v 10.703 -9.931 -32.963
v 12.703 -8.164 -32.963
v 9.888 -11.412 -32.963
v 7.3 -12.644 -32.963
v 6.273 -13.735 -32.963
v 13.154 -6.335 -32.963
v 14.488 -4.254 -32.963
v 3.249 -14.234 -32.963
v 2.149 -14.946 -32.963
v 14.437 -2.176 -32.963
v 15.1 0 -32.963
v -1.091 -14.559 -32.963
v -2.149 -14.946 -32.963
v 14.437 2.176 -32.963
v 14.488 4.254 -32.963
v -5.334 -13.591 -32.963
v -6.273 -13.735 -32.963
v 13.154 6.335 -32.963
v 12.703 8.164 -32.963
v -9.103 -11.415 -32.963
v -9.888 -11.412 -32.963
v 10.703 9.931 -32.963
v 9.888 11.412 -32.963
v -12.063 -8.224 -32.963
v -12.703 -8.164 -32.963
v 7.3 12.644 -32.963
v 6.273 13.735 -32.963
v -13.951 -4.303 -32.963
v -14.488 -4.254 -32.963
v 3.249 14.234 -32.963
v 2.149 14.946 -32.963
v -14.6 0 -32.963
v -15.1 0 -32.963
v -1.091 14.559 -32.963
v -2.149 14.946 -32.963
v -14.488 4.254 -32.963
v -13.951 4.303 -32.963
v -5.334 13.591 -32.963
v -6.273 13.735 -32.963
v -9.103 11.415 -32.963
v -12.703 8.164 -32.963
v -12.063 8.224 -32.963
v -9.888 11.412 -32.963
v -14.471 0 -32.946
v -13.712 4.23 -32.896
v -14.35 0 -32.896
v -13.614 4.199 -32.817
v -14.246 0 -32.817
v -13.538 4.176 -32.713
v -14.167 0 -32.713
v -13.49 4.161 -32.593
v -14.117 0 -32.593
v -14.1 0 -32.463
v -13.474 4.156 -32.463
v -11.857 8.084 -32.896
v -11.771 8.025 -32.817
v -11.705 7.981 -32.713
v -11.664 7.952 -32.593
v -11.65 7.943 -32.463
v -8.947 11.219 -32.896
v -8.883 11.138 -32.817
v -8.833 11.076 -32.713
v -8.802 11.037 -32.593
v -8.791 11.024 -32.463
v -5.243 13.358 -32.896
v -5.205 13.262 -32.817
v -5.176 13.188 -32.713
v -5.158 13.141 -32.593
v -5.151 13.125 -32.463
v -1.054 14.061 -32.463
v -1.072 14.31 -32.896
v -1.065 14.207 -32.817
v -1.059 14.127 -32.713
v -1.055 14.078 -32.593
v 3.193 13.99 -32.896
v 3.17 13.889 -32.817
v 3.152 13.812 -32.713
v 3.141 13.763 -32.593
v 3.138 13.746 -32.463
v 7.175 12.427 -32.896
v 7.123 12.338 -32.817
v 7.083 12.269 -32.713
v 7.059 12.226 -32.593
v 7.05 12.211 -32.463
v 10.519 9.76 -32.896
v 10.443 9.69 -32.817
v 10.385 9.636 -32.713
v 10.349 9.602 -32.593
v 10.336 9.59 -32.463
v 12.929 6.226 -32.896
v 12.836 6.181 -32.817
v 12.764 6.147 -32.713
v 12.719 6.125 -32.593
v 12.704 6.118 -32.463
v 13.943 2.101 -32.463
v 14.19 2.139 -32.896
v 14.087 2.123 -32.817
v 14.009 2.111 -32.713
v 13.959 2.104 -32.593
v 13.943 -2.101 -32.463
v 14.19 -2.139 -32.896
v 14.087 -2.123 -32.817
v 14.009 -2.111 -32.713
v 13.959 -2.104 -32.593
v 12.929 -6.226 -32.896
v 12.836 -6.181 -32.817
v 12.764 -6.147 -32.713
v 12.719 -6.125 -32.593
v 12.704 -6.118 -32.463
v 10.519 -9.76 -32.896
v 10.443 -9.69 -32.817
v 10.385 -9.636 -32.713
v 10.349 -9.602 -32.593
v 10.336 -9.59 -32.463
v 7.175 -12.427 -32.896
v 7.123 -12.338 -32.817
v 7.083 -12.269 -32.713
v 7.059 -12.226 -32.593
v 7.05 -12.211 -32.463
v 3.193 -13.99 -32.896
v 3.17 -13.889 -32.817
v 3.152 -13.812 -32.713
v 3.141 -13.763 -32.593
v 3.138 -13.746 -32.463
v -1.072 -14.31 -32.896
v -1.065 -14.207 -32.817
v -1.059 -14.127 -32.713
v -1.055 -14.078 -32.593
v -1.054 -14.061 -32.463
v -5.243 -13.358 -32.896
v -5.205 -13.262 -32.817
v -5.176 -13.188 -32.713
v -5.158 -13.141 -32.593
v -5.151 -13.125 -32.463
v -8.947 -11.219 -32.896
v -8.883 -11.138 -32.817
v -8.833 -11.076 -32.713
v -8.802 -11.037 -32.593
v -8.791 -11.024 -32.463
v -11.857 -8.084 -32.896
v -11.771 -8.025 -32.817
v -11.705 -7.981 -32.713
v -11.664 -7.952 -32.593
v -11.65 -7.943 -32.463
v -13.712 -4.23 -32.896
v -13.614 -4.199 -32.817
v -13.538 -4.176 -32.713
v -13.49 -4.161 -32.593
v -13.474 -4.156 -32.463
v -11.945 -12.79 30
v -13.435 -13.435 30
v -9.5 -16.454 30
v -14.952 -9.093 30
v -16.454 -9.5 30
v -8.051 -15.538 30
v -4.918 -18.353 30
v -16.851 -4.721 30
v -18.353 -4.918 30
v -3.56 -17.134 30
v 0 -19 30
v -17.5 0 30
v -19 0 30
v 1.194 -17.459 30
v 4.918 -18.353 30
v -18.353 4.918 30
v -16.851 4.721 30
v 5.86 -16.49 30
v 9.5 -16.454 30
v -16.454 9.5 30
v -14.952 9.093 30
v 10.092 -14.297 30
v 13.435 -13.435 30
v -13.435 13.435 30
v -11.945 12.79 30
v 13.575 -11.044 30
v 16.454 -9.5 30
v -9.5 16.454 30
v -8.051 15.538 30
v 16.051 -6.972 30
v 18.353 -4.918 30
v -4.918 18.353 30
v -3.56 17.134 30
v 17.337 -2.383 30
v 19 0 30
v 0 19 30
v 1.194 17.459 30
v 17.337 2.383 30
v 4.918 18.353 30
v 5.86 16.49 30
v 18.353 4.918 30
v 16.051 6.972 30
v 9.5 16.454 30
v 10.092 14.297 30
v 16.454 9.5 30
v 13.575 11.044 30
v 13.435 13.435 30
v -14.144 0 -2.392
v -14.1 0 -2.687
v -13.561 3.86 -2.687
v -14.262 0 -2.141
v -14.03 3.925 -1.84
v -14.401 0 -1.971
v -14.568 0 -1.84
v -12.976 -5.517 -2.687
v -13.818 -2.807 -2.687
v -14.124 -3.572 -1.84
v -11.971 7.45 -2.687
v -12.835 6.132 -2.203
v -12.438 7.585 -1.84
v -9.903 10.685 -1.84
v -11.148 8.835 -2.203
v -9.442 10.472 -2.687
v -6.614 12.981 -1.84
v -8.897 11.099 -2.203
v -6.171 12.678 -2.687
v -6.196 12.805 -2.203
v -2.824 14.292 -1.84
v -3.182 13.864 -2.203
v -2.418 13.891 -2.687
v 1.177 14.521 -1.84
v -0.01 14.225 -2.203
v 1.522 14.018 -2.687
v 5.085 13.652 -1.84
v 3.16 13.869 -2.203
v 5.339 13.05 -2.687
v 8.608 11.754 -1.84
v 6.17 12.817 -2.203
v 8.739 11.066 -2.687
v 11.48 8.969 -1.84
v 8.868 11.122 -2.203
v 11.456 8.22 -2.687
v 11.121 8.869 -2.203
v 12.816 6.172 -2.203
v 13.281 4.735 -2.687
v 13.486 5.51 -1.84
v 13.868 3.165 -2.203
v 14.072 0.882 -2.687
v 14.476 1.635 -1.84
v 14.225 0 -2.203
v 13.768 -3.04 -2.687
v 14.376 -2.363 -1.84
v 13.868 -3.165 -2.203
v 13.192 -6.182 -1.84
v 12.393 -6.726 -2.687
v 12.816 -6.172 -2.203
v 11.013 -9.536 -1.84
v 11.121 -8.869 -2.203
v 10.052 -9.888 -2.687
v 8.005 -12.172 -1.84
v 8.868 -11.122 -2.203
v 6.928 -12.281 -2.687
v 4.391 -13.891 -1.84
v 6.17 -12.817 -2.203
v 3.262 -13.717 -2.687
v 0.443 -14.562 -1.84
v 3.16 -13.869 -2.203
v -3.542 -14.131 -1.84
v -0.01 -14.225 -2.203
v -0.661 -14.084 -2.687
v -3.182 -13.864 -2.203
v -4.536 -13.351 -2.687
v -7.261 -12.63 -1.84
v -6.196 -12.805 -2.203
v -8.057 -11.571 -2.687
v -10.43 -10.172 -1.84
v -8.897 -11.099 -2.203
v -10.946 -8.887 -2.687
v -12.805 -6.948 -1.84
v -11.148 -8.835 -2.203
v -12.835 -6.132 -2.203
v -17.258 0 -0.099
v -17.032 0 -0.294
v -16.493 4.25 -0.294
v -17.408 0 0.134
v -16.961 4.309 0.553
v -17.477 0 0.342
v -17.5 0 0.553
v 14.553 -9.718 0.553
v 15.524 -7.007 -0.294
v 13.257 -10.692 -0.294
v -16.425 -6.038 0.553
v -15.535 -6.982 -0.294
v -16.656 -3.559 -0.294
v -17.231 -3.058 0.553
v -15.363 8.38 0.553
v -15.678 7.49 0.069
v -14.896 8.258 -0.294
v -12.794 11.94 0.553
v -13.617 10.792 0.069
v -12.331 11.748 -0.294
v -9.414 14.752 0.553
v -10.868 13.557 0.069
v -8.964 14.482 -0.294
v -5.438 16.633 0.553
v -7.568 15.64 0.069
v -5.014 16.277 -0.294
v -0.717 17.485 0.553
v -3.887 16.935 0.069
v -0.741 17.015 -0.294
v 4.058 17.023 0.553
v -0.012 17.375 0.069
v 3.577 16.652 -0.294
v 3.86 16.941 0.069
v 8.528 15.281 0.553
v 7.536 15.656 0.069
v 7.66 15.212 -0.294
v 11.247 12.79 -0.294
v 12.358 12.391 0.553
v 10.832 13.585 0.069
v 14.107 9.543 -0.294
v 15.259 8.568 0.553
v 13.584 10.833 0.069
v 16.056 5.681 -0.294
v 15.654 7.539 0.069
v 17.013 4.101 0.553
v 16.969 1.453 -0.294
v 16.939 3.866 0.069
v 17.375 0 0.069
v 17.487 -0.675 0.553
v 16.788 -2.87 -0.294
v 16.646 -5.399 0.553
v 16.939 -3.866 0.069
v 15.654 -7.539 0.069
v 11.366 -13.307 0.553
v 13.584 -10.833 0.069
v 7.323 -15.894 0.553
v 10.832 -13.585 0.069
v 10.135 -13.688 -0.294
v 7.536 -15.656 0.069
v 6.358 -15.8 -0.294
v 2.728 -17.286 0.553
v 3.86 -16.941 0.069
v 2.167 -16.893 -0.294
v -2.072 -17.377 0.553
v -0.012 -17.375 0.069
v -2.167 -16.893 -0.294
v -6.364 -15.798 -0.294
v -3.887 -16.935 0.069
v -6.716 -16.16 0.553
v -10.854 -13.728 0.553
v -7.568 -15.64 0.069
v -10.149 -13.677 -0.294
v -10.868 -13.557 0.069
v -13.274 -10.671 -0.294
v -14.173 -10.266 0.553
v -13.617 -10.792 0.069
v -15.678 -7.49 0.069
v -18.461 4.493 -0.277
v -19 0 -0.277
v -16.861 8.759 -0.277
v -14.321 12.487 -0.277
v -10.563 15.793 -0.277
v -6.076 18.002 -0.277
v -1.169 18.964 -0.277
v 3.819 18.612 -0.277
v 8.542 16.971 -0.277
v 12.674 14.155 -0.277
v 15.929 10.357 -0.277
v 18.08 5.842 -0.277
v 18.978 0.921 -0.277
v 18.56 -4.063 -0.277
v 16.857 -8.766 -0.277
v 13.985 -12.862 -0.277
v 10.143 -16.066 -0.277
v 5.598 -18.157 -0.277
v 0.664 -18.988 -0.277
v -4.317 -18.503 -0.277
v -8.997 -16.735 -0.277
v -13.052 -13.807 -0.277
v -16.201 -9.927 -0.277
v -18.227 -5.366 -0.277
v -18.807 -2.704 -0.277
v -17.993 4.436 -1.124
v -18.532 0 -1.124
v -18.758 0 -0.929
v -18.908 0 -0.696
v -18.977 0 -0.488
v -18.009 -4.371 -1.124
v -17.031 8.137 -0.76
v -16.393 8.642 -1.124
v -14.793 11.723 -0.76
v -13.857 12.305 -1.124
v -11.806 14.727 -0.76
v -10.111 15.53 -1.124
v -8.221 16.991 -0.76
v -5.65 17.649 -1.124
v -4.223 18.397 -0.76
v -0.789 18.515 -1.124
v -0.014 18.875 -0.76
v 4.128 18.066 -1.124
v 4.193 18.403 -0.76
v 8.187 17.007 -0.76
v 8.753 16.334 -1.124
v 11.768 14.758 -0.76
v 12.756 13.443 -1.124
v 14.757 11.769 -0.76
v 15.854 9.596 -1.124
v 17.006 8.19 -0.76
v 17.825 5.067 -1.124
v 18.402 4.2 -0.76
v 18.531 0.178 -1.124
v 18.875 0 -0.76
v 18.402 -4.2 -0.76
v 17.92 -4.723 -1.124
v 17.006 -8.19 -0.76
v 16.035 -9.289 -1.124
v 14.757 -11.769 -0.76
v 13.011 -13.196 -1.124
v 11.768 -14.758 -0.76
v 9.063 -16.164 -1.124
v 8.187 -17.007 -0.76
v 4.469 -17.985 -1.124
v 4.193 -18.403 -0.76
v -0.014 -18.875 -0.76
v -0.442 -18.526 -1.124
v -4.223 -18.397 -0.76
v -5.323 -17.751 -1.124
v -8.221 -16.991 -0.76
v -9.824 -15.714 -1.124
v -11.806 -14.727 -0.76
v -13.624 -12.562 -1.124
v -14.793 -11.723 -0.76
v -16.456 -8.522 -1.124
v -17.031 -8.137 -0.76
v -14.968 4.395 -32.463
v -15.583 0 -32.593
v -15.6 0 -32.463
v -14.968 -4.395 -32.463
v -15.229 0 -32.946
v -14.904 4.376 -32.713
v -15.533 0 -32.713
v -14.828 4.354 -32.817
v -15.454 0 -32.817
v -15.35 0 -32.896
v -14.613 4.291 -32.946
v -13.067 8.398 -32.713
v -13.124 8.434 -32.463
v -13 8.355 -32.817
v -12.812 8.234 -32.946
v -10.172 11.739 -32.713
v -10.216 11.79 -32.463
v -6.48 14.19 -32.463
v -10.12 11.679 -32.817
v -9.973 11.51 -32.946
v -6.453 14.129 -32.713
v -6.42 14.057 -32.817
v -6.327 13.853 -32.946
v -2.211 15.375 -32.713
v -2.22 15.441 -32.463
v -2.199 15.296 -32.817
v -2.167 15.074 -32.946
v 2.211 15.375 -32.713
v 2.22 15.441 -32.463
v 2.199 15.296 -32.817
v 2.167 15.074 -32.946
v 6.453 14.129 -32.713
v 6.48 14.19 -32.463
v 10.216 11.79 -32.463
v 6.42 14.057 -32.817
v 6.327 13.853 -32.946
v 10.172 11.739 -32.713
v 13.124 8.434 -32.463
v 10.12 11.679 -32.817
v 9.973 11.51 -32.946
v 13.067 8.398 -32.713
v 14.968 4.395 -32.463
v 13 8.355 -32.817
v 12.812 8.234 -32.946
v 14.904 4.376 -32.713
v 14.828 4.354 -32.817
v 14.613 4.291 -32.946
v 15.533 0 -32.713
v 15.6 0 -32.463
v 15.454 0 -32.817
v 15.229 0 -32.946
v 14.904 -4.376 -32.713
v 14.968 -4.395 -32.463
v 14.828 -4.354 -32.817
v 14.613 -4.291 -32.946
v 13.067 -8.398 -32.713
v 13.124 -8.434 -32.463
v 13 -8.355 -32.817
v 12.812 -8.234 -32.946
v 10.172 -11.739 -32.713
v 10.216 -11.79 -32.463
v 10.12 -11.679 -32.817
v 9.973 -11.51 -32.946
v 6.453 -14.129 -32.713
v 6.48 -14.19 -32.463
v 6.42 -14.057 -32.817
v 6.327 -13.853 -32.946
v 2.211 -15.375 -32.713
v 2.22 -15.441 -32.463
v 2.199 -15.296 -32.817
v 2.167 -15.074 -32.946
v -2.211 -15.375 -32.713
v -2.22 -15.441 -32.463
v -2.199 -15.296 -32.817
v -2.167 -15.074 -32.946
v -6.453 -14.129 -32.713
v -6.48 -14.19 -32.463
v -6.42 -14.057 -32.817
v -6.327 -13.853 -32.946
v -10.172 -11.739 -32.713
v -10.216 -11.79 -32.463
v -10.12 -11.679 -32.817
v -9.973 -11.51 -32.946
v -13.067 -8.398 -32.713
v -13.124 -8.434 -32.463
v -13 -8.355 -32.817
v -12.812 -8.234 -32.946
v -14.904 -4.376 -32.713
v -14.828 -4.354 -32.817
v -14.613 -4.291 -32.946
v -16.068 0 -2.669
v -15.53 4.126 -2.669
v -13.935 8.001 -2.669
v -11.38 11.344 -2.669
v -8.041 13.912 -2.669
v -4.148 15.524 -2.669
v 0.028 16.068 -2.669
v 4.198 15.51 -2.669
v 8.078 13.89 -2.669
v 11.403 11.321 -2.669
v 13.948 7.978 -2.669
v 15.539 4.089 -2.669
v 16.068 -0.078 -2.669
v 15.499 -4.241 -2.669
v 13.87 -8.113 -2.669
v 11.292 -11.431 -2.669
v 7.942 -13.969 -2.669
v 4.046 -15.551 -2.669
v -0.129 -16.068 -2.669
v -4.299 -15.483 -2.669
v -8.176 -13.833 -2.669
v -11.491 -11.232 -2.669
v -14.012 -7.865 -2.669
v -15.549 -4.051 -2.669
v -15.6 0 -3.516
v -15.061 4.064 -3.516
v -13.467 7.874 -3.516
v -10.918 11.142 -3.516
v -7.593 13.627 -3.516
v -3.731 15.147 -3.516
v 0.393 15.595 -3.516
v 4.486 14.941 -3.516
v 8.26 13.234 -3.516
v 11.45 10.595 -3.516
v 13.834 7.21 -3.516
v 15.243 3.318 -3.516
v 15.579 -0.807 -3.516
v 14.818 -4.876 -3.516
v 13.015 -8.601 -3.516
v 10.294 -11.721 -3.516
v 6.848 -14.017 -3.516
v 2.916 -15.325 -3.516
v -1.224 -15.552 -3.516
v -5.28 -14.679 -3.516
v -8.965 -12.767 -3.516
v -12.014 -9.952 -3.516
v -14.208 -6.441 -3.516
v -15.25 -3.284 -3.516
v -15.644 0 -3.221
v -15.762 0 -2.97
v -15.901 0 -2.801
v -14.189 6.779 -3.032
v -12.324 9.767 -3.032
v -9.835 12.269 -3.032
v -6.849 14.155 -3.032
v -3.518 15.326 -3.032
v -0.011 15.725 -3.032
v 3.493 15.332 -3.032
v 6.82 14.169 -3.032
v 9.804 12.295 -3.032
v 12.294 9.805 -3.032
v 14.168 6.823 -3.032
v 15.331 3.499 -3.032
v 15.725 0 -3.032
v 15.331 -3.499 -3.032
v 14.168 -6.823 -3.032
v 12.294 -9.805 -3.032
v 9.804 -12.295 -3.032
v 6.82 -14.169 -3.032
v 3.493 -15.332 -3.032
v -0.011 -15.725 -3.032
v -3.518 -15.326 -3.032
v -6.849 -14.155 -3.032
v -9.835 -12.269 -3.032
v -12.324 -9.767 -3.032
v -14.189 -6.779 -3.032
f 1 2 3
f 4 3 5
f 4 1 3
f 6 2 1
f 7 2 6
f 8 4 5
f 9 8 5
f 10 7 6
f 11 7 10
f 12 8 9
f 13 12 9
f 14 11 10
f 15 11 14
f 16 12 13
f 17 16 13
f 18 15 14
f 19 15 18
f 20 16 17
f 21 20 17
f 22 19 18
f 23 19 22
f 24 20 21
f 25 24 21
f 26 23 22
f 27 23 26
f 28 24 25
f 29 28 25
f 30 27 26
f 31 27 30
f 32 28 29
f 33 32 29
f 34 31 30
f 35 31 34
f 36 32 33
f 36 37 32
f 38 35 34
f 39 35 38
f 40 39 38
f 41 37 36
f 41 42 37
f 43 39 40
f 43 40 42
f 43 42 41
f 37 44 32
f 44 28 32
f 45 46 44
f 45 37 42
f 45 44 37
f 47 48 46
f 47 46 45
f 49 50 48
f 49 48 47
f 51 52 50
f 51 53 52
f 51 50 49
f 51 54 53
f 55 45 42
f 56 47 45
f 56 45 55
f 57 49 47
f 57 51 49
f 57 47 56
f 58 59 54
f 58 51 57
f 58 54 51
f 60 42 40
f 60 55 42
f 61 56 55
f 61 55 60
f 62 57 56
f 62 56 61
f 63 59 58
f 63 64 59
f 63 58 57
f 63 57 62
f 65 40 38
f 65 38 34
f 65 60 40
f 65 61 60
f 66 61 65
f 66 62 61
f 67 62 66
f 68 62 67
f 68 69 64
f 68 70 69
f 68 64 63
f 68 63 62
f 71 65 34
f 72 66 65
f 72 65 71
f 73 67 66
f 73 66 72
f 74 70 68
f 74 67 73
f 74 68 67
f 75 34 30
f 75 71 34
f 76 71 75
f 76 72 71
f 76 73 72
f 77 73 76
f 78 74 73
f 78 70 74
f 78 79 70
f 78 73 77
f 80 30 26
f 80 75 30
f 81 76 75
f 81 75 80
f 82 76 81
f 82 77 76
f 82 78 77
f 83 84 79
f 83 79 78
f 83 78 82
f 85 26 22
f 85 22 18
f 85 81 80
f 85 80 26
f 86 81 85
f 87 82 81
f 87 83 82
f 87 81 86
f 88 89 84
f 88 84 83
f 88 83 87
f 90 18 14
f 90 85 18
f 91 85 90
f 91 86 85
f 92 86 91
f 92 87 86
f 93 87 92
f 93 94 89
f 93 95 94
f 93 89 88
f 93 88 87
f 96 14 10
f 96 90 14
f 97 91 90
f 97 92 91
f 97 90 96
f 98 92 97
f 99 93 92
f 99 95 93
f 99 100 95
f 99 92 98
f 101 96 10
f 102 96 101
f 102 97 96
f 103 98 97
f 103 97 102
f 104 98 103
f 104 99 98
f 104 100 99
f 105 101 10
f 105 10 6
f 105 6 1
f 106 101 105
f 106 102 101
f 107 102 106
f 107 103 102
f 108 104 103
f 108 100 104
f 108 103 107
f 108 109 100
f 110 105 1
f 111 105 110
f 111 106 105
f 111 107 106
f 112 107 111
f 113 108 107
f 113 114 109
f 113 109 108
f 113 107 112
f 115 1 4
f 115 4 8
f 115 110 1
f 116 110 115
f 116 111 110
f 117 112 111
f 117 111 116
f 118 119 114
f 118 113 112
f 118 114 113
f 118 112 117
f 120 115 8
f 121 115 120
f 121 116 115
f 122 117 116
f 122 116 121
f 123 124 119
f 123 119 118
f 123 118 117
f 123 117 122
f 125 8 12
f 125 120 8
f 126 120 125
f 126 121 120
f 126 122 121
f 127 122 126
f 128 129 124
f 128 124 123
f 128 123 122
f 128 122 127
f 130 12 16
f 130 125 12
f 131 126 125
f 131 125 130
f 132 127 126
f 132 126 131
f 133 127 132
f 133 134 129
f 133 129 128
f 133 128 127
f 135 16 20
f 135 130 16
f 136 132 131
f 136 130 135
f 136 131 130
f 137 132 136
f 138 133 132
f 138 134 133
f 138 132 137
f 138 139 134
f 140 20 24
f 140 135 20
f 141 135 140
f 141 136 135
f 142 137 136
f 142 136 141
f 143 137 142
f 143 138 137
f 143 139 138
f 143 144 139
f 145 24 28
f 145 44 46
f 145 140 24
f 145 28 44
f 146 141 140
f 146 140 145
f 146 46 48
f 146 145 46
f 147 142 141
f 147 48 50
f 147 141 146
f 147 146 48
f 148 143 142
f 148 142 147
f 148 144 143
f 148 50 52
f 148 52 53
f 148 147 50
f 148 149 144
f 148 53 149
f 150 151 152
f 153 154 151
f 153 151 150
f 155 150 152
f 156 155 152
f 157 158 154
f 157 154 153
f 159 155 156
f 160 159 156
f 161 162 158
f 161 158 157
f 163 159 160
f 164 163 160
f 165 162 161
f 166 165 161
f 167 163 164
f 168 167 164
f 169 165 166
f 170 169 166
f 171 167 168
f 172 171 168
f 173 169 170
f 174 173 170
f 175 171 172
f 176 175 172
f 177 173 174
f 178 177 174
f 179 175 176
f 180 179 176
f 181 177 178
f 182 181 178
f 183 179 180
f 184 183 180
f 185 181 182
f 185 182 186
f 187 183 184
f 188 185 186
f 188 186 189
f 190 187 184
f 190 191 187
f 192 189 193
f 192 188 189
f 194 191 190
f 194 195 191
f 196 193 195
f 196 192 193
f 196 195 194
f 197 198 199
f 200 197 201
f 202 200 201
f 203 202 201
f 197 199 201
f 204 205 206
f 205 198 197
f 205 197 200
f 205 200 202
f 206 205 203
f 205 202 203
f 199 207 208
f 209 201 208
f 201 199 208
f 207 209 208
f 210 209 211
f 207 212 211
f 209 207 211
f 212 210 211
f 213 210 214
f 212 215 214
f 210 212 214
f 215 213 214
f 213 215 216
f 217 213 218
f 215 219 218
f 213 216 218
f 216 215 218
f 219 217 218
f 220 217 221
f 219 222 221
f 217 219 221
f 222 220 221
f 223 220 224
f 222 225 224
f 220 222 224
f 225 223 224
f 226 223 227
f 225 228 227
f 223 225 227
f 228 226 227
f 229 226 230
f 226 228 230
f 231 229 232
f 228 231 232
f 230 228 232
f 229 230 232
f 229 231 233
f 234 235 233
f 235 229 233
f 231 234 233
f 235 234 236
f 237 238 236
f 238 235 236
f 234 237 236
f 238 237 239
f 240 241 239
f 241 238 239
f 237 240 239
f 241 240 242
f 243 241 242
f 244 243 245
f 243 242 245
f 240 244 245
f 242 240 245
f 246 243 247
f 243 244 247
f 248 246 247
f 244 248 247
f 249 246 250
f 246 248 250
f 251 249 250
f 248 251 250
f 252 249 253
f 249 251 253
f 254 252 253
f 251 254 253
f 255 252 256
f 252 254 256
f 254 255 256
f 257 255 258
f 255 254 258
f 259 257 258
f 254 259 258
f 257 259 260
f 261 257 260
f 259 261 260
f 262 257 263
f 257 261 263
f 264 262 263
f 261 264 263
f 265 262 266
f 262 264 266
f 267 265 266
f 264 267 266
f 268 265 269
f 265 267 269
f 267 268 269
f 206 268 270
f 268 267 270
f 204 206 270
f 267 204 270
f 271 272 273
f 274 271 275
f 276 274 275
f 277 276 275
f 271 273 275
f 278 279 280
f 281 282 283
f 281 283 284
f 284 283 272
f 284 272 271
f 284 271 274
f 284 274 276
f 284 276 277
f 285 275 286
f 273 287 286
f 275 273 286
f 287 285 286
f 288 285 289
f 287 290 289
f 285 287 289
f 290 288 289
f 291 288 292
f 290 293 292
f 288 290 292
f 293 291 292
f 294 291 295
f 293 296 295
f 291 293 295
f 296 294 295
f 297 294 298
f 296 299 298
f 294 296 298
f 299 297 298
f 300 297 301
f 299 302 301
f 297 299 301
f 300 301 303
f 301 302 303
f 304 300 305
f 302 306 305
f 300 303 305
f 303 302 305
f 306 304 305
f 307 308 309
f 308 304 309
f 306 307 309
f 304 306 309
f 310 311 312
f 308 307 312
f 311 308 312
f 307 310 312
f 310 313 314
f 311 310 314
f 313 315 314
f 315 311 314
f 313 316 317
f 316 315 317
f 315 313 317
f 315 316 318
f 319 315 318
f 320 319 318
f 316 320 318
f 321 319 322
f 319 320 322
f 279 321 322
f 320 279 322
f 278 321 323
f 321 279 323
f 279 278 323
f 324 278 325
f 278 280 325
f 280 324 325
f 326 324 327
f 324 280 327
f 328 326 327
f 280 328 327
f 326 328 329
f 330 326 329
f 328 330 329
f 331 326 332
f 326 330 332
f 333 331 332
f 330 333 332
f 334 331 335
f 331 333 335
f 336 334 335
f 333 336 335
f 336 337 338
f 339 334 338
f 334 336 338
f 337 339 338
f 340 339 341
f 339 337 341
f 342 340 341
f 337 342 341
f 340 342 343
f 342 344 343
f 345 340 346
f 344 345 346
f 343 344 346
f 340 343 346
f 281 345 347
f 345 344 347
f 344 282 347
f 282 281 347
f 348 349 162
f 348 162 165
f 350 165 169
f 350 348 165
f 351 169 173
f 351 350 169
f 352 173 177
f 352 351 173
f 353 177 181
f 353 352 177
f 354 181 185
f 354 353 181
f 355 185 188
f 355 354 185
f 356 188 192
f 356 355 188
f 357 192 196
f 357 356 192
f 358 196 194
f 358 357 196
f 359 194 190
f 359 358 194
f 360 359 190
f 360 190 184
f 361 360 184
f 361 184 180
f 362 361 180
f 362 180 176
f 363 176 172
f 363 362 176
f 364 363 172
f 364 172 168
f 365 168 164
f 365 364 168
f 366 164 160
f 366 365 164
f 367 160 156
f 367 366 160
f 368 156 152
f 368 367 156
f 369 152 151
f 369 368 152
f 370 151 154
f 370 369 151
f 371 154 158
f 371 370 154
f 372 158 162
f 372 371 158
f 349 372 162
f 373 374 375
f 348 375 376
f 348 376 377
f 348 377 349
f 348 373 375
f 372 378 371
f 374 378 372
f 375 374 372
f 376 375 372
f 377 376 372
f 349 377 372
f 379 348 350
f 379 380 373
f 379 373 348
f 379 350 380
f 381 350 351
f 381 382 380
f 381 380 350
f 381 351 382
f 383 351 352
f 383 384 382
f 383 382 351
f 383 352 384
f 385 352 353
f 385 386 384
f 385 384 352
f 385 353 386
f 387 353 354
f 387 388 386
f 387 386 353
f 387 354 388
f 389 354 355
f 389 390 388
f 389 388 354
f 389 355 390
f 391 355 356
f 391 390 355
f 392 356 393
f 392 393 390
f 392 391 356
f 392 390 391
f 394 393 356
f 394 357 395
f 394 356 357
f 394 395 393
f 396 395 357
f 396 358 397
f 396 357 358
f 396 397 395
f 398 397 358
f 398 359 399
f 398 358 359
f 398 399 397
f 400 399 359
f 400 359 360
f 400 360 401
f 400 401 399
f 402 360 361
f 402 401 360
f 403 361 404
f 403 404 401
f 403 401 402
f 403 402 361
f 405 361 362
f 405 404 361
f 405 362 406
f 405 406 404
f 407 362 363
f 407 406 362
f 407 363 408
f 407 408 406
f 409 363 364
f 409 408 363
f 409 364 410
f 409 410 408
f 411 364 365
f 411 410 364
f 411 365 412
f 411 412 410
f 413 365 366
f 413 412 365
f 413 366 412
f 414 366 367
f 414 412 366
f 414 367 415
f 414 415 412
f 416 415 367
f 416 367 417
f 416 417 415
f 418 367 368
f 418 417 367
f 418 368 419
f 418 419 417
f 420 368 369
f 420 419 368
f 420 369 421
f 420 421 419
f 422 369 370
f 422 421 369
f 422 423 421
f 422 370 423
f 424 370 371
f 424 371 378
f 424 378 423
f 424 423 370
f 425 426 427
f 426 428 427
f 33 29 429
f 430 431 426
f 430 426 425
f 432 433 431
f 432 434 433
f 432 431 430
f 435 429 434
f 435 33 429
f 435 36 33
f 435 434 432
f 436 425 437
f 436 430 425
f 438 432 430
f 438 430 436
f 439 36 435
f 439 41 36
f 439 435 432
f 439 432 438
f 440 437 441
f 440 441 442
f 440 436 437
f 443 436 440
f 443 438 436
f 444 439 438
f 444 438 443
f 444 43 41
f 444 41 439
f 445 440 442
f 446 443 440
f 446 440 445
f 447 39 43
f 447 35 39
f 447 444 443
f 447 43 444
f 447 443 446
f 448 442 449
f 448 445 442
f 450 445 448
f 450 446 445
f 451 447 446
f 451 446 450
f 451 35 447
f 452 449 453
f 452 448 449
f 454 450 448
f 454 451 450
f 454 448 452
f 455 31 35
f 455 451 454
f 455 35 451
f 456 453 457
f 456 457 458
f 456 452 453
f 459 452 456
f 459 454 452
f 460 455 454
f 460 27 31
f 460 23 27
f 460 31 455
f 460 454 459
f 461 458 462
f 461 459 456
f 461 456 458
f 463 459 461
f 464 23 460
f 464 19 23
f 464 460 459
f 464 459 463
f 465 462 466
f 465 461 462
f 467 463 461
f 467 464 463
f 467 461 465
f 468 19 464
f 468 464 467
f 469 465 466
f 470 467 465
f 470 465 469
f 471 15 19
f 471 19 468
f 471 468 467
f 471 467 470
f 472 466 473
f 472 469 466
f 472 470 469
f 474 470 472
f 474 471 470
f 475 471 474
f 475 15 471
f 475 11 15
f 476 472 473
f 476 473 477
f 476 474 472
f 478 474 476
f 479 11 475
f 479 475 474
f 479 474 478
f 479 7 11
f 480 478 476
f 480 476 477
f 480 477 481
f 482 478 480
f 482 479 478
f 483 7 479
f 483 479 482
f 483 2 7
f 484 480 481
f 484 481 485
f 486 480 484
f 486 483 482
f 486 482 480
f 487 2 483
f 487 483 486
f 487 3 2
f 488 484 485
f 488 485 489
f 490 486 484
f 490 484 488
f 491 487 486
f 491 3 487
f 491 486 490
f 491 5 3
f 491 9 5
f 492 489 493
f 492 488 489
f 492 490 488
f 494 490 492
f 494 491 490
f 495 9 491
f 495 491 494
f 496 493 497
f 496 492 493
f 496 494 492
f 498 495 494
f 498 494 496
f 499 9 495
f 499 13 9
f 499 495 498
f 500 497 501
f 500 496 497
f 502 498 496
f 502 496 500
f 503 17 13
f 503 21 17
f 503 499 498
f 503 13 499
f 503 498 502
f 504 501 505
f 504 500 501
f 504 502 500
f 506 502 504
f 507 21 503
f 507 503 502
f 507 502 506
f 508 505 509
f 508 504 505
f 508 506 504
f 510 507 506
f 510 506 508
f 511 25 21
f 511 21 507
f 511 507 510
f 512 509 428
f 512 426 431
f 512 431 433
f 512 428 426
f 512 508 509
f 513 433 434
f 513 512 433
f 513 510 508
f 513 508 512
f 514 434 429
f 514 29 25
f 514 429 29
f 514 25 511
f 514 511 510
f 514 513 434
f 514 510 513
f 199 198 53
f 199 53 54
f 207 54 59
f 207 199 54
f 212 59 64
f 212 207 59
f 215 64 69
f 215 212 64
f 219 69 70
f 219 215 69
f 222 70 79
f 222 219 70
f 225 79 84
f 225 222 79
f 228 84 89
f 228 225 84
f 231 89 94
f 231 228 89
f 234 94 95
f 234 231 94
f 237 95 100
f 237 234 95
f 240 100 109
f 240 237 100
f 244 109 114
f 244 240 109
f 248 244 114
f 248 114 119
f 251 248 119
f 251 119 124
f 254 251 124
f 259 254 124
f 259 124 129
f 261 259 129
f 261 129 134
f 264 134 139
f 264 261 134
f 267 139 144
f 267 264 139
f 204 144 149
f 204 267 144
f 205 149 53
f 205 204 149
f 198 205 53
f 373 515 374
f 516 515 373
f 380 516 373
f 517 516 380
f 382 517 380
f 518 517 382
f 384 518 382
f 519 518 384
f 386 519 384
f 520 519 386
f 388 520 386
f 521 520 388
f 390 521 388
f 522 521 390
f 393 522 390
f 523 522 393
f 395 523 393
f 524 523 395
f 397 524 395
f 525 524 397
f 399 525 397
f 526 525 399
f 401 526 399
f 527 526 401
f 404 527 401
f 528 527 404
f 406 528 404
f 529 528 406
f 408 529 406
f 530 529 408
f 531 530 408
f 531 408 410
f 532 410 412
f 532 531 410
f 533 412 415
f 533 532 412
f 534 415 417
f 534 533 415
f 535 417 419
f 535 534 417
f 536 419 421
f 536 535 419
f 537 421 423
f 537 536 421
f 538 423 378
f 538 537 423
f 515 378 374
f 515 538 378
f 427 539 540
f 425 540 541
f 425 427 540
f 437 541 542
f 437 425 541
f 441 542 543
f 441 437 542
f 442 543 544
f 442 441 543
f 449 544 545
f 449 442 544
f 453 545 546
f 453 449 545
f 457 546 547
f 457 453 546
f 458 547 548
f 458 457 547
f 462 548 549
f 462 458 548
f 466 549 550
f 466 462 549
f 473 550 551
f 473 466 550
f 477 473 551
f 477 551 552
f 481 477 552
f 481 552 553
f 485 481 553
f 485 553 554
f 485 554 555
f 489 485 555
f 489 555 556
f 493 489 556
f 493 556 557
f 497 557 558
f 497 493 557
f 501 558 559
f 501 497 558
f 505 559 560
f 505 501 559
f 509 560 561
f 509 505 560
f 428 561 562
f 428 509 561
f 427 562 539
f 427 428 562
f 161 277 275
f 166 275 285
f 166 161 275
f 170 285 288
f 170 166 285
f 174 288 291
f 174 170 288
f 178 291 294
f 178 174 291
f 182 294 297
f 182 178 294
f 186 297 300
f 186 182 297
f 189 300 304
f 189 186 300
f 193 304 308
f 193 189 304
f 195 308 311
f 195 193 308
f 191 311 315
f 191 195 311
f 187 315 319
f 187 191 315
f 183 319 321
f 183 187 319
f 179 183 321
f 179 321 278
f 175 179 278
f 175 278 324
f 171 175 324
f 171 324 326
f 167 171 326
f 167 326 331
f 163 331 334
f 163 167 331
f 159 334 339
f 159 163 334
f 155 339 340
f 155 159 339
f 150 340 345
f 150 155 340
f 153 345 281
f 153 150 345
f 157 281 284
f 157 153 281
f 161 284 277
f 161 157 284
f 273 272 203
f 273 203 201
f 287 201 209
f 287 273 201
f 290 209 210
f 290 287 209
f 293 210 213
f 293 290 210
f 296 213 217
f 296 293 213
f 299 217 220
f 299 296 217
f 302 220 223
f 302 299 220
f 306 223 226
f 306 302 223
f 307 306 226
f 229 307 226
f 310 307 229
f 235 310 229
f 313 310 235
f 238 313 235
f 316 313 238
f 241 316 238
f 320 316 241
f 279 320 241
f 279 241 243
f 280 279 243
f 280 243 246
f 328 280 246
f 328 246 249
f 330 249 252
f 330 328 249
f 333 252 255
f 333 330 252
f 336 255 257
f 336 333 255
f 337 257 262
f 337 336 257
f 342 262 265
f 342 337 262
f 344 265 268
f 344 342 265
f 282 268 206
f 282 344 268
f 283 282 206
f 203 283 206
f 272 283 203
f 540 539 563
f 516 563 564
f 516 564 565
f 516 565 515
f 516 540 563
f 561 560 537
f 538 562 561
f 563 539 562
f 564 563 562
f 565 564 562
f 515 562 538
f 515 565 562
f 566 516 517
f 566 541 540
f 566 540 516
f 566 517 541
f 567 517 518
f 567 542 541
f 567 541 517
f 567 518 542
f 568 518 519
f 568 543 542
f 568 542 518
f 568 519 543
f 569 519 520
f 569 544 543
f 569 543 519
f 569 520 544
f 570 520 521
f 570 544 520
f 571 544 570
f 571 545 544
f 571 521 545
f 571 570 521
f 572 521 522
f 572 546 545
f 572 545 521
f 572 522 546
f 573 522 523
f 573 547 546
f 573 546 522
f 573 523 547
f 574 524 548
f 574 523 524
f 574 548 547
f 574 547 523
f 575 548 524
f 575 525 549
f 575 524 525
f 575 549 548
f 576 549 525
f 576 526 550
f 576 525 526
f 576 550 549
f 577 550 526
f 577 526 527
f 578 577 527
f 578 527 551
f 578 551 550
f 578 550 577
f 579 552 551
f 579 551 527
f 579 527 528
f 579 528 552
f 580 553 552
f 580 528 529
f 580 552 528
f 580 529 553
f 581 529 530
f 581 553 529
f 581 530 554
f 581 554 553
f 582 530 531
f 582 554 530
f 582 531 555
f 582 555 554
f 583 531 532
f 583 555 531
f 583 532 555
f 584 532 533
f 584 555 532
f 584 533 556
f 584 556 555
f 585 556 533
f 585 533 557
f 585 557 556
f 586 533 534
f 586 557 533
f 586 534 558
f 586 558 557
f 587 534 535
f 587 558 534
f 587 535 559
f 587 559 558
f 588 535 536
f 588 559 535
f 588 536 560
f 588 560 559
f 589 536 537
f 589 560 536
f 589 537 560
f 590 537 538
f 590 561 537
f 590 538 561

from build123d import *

# Parameters (mm, degrees)
F2_R = 0.5
F3_R = 1
F4_R = 1


with BuildPart() as f1:
    # F0 (on Front) → F1 (revolve)
    with BuildSketch(Plane.XZ):
        Polygon((-17.5, 0), (-17.5, 30), (-19, 30), (-19, -0.829571), (-15.6, -2.963267), (-15.6, -32.963267), (-14.1, -32.963267), (-14.1, -2.133696), align=None)
    revolve(axis=Axis((0, 0, 4.728004), (0, 0, -1)))

    # F2
    f2_edges = [f1.edges().sort_by_distance(p)[0] for p in [
        (15.6, 0, -32.963267),
        (14.1, 0, -32.963267),
    ]]
    fillet(f2_edges, radius=F2_R)

    # F3
    f3_edges = [f1.edges().sort_by_distance(p)[0] for p in [
        (19, 0, -0.829571),
        (15.6, 0, -2.963267),
    ]]
    fillet(f3_edges, radius=F3_R)

    # F4
    f4_edges = [f1.edges().sort_by_distance(p)[0] for p in [
        (14.1, 0, -2.133696),
        (17.5, 0, 0),
    ]]
    fillet(f4_edges, radius=F4_R)


solid = f1.part
